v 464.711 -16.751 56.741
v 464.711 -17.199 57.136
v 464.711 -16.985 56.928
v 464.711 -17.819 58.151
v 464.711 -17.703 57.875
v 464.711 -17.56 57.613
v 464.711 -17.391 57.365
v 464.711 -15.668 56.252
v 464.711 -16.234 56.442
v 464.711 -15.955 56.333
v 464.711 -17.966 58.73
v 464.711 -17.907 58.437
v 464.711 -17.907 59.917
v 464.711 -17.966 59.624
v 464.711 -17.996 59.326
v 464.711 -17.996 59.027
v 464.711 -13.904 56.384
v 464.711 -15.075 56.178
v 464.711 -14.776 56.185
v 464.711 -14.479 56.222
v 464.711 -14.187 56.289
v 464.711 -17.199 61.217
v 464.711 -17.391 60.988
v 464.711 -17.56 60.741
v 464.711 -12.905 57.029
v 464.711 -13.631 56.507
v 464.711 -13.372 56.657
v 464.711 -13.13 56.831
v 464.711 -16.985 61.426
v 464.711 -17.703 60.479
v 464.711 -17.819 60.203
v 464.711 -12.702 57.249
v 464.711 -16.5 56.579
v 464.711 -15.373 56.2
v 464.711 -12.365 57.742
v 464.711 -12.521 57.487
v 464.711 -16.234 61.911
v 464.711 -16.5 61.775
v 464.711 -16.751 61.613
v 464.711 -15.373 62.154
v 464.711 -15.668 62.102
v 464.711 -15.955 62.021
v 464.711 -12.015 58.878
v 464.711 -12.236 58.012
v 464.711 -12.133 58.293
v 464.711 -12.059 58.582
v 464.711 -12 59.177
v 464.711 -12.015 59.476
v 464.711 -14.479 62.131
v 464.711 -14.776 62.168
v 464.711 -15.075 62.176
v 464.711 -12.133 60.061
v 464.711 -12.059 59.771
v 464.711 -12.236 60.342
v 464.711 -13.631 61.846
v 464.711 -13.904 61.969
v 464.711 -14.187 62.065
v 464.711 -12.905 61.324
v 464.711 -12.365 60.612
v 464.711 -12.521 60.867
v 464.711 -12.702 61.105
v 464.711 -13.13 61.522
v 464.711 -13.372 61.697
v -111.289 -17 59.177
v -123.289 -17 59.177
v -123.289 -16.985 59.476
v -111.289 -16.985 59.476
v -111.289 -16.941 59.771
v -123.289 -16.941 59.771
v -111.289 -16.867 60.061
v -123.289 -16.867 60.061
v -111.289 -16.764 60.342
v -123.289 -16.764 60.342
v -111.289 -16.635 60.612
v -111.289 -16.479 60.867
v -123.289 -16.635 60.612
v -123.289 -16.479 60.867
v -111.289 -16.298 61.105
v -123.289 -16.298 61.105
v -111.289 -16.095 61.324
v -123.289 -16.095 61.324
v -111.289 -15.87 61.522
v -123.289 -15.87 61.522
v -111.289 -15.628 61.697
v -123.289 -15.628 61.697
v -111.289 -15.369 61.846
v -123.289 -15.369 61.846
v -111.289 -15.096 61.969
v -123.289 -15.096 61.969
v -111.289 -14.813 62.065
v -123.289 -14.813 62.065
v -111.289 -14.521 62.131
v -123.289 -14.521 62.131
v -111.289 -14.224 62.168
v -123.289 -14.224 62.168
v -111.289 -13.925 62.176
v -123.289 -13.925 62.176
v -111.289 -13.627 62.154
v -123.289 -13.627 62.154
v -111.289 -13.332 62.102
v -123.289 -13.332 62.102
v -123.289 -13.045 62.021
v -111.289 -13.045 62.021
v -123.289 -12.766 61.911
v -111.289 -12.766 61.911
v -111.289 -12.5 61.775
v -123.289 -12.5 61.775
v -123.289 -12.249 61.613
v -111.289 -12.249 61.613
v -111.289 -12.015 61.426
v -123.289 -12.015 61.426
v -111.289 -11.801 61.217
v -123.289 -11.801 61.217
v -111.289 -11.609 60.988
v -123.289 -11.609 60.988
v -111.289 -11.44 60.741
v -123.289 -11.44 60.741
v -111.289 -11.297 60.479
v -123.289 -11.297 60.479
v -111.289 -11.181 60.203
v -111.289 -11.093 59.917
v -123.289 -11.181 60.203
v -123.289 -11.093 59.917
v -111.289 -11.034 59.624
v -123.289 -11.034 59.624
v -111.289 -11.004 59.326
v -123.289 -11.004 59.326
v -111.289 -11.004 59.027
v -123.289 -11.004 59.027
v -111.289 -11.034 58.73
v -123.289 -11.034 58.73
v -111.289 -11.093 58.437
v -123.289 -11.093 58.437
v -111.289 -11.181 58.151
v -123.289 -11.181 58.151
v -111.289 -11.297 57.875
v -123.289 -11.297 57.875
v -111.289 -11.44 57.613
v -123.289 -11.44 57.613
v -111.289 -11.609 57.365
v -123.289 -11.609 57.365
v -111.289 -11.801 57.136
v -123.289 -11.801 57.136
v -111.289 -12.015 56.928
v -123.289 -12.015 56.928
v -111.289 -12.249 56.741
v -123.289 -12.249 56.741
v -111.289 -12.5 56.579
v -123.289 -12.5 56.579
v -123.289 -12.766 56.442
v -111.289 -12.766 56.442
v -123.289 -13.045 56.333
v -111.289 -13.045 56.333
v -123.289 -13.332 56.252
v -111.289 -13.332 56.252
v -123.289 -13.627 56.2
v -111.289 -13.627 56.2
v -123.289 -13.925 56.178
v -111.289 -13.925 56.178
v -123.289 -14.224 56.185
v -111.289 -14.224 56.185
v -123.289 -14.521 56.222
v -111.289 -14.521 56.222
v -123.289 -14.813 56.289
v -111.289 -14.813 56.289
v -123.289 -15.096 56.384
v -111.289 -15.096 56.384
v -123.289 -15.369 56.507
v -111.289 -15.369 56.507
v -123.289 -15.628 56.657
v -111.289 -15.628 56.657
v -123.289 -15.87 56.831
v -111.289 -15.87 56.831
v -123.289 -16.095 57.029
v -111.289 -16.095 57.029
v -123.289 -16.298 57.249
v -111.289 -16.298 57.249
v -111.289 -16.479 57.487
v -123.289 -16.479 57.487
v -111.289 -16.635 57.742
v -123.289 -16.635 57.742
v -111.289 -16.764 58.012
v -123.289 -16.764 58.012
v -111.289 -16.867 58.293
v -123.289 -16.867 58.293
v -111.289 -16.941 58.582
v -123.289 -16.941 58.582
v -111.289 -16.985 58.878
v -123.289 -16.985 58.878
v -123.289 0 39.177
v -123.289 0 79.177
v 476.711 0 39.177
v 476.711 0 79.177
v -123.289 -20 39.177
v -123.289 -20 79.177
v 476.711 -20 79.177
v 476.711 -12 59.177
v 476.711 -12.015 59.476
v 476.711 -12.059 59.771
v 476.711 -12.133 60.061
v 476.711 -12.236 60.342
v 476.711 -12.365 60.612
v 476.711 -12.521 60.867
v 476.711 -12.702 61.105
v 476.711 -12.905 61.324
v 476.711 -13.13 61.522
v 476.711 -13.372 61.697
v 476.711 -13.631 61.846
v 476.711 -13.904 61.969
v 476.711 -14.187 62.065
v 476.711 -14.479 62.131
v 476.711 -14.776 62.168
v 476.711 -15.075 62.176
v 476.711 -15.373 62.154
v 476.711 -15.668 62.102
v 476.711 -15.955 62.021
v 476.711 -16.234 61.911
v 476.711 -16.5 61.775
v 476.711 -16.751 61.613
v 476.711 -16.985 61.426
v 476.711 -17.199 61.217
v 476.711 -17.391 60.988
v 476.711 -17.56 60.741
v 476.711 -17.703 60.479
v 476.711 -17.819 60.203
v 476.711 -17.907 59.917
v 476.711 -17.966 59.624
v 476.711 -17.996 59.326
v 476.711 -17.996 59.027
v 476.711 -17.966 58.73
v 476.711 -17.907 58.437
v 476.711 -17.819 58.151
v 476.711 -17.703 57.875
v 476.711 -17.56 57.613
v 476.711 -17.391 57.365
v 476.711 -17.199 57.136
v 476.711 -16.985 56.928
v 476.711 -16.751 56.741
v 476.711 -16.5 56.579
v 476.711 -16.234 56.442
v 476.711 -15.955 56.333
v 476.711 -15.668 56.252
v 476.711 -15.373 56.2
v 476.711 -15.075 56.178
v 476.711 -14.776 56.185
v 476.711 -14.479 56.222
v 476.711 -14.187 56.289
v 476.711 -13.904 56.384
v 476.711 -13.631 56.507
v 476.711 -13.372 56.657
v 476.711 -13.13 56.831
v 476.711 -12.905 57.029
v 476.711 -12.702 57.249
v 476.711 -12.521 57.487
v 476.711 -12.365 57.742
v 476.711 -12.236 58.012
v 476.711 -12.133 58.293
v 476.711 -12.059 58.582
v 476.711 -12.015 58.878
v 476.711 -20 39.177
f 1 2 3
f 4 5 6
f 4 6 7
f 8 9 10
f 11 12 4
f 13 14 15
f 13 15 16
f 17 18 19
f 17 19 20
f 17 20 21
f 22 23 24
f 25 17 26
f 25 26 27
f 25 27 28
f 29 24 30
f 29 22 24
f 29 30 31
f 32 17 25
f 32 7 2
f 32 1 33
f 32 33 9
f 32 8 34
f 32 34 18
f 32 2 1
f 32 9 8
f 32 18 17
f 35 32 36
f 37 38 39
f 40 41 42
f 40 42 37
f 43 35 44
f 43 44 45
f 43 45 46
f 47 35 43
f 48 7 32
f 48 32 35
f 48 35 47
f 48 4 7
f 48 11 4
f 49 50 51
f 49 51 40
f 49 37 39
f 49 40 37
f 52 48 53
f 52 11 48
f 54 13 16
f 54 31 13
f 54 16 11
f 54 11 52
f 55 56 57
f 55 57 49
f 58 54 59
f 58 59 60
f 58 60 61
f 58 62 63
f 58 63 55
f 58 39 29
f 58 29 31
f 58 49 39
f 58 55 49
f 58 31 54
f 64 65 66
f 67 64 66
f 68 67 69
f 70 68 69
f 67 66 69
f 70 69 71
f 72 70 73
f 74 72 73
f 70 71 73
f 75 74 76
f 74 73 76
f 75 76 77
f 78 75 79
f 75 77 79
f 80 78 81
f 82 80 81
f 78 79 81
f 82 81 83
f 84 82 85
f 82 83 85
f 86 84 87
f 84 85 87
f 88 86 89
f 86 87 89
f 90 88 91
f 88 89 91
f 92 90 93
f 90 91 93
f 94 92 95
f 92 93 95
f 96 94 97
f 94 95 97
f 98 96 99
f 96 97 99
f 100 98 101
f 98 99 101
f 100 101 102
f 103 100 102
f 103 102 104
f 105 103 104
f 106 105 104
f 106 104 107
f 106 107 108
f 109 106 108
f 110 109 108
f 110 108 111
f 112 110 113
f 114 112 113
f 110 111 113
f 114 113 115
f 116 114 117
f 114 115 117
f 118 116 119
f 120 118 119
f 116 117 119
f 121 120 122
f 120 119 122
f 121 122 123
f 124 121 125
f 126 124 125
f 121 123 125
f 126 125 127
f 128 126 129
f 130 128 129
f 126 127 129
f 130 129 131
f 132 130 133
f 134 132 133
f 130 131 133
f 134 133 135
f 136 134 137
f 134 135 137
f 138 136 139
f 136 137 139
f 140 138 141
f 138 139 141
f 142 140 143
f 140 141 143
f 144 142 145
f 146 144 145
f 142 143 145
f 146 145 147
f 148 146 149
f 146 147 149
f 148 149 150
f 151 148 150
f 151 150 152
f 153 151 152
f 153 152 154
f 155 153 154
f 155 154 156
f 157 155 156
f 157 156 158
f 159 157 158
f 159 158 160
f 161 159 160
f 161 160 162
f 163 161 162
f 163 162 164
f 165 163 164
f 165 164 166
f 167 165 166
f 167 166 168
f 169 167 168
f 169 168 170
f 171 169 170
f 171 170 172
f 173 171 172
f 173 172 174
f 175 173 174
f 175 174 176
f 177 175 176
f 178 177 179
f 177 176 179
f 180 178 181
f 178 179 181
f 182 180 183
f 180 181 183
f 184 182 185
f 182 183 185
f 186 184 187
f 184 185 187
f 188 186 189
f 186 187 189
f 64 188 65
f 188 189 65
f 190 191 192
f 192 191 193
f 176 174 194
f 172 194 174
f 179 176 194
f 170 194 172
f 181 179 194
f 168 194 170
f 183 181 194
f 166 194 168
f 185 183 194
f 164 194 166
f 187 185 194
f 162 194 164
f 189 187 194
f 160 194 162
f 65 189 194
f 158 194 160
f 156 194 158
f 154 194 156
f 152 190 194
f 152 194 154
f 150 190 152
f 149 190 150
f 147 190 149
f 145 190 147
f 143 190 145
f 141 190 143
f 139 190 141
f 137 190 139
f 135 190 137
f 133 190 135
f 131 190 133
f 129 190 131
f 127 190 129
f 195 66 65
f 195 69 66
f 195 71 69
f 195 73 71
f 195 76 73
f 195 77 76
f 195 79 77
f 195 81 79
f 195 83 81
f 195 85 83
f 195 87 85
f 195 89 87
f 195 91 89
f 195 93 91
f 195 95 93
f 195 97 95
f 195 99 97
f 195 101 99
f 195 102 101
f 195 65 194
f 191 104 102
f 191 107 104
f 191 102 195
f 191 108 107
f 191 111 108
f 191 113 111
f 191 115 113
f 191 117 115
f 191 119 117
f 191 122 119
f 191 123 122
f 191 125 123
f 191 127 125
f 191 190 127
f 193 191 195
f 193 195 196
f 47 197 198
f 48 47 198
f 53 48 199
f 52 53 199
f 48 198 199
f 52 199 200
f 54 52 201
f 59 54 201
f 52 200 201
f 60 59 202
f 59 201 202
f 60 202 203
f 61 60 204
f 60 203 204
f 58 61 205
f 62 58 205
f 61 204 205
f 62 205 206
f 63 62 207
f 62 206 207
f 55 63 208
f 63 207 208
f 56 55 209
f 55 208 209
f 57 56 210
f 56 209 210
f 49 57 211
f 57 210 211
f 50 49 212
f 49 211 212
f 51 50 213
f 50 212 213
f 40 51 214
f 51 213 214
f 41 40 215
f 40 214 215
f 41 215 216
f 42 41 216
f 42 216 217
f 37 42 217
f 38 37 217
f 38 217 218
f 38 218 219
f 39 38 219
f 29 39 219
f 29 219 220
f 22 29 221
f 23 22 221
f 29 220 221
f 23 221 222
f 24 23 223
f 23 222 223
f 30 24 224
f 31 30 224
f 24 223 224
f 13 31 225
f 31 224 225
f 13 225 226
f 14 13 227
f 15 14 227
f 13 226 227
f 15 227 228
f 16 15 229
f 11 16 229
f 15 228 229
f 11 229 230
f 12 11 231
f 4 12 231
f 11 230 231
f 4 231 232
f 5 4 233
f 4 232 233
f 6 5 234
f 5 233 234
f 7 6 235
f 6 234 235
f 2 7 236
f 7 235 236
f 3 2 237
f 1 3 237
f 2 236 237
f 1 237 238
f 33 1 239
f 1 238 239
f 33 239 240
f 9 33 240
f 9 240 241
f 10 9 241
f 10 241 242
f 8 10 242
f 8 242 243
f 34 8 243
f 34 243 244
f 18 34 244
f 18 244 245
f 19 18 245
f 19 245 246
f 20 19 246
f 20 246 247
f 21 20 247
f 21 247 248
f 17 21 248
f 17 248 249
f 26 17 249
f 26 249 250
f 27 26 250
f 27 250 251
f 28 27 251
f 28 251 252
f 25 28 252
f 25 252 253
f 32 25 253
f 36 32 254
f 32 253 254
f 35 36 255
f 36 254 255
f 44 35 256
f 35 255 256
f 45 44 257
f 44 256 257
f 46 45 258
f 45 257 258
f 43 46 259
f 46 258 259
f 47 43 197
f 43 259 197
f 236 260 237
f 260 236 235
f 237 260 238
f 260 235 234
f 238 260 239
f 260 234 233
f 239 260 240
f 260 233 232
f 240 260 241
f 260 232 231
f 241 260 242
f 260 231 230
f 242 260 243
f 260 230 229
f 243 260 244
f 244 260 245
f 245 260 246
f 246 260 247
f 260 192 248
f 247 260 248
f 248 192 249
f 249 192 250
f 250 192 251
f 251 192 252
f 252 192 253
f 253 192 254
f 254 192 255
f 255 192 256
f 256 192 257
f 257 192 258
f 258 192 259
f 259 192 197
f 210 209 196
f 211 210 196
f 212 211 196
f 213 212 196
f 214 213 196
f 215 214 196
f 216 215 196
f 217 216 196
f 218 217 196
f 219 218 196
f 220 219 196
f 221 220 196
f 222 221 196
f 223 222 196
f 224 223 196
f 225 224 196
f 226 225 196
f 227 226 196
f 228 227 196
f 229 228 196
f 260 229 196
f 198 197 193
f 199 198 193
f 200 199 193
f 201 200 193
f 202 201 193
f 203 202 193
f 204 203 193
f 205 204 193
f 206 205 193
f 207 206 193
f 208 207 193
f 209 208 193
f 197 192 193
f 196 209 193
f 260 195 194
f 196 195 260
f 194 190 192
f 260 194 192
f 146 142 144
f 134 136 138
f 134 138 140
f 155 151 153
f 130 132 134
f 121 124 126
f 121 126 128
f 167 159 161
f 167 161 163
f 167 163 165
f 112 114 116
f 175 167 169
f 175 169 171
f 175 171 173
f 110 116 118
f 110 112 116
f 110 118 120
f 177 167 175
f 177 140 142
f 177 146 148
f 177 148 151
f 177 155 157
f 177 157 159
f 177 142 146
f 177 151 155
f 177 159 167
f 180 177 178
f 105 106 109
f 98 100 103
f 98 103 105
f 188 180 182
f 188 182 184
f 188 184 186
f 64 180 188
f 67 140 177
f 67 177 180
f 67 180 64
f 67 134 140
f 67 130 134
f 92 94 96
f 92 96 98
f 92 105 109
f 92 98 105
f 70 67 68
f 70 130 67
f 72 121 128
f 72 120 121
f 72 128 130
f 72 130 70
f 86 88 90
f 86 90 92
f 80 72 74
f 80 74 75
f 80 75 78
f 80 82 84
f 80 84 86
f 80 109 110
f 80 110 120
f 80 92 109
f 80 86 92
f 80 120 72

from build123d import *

# Parameters (mm, degrees)
F0_W     = 600
F0_H     = 40
F1_DEPTH = 20
F2_R     = 3
F3_DEPTH = 12
F4_R     = 3
F5_DEPTH = 12


with BuildPart() as f1:
    # F0 (on Front) → F1 (new body)
    with BuildSketch(Plane.XZ):
        with Locations((176.711192, 59.176866)):
            Rectangle(F0_W, F0_H)
    extrude(amount=F1_DEPTH)

    # F2 (on face) → F3 (cut)
    with BuildSketch(Plane.YZ.offset(476.711192)):
        with Locations((-15, 59.176866)):
            Circle(F2_R)
    extrude(amount=-F3_DEPTH, mode=Mode.SUBTRACT)

    # F4 (on face) → F5 (cut)
    with BuildSketch(Plane(origin=(-123.288808, 0, 0), x_dir=(0, -1, 0), z_dir=(-1, 0, 0))):
        with Locations((14, 59.176866)):
            Circle(F4_R)
    extrude(amount=-F5_DEPTH, mode=Mode.SUBTRACT)


solid = f1.part
